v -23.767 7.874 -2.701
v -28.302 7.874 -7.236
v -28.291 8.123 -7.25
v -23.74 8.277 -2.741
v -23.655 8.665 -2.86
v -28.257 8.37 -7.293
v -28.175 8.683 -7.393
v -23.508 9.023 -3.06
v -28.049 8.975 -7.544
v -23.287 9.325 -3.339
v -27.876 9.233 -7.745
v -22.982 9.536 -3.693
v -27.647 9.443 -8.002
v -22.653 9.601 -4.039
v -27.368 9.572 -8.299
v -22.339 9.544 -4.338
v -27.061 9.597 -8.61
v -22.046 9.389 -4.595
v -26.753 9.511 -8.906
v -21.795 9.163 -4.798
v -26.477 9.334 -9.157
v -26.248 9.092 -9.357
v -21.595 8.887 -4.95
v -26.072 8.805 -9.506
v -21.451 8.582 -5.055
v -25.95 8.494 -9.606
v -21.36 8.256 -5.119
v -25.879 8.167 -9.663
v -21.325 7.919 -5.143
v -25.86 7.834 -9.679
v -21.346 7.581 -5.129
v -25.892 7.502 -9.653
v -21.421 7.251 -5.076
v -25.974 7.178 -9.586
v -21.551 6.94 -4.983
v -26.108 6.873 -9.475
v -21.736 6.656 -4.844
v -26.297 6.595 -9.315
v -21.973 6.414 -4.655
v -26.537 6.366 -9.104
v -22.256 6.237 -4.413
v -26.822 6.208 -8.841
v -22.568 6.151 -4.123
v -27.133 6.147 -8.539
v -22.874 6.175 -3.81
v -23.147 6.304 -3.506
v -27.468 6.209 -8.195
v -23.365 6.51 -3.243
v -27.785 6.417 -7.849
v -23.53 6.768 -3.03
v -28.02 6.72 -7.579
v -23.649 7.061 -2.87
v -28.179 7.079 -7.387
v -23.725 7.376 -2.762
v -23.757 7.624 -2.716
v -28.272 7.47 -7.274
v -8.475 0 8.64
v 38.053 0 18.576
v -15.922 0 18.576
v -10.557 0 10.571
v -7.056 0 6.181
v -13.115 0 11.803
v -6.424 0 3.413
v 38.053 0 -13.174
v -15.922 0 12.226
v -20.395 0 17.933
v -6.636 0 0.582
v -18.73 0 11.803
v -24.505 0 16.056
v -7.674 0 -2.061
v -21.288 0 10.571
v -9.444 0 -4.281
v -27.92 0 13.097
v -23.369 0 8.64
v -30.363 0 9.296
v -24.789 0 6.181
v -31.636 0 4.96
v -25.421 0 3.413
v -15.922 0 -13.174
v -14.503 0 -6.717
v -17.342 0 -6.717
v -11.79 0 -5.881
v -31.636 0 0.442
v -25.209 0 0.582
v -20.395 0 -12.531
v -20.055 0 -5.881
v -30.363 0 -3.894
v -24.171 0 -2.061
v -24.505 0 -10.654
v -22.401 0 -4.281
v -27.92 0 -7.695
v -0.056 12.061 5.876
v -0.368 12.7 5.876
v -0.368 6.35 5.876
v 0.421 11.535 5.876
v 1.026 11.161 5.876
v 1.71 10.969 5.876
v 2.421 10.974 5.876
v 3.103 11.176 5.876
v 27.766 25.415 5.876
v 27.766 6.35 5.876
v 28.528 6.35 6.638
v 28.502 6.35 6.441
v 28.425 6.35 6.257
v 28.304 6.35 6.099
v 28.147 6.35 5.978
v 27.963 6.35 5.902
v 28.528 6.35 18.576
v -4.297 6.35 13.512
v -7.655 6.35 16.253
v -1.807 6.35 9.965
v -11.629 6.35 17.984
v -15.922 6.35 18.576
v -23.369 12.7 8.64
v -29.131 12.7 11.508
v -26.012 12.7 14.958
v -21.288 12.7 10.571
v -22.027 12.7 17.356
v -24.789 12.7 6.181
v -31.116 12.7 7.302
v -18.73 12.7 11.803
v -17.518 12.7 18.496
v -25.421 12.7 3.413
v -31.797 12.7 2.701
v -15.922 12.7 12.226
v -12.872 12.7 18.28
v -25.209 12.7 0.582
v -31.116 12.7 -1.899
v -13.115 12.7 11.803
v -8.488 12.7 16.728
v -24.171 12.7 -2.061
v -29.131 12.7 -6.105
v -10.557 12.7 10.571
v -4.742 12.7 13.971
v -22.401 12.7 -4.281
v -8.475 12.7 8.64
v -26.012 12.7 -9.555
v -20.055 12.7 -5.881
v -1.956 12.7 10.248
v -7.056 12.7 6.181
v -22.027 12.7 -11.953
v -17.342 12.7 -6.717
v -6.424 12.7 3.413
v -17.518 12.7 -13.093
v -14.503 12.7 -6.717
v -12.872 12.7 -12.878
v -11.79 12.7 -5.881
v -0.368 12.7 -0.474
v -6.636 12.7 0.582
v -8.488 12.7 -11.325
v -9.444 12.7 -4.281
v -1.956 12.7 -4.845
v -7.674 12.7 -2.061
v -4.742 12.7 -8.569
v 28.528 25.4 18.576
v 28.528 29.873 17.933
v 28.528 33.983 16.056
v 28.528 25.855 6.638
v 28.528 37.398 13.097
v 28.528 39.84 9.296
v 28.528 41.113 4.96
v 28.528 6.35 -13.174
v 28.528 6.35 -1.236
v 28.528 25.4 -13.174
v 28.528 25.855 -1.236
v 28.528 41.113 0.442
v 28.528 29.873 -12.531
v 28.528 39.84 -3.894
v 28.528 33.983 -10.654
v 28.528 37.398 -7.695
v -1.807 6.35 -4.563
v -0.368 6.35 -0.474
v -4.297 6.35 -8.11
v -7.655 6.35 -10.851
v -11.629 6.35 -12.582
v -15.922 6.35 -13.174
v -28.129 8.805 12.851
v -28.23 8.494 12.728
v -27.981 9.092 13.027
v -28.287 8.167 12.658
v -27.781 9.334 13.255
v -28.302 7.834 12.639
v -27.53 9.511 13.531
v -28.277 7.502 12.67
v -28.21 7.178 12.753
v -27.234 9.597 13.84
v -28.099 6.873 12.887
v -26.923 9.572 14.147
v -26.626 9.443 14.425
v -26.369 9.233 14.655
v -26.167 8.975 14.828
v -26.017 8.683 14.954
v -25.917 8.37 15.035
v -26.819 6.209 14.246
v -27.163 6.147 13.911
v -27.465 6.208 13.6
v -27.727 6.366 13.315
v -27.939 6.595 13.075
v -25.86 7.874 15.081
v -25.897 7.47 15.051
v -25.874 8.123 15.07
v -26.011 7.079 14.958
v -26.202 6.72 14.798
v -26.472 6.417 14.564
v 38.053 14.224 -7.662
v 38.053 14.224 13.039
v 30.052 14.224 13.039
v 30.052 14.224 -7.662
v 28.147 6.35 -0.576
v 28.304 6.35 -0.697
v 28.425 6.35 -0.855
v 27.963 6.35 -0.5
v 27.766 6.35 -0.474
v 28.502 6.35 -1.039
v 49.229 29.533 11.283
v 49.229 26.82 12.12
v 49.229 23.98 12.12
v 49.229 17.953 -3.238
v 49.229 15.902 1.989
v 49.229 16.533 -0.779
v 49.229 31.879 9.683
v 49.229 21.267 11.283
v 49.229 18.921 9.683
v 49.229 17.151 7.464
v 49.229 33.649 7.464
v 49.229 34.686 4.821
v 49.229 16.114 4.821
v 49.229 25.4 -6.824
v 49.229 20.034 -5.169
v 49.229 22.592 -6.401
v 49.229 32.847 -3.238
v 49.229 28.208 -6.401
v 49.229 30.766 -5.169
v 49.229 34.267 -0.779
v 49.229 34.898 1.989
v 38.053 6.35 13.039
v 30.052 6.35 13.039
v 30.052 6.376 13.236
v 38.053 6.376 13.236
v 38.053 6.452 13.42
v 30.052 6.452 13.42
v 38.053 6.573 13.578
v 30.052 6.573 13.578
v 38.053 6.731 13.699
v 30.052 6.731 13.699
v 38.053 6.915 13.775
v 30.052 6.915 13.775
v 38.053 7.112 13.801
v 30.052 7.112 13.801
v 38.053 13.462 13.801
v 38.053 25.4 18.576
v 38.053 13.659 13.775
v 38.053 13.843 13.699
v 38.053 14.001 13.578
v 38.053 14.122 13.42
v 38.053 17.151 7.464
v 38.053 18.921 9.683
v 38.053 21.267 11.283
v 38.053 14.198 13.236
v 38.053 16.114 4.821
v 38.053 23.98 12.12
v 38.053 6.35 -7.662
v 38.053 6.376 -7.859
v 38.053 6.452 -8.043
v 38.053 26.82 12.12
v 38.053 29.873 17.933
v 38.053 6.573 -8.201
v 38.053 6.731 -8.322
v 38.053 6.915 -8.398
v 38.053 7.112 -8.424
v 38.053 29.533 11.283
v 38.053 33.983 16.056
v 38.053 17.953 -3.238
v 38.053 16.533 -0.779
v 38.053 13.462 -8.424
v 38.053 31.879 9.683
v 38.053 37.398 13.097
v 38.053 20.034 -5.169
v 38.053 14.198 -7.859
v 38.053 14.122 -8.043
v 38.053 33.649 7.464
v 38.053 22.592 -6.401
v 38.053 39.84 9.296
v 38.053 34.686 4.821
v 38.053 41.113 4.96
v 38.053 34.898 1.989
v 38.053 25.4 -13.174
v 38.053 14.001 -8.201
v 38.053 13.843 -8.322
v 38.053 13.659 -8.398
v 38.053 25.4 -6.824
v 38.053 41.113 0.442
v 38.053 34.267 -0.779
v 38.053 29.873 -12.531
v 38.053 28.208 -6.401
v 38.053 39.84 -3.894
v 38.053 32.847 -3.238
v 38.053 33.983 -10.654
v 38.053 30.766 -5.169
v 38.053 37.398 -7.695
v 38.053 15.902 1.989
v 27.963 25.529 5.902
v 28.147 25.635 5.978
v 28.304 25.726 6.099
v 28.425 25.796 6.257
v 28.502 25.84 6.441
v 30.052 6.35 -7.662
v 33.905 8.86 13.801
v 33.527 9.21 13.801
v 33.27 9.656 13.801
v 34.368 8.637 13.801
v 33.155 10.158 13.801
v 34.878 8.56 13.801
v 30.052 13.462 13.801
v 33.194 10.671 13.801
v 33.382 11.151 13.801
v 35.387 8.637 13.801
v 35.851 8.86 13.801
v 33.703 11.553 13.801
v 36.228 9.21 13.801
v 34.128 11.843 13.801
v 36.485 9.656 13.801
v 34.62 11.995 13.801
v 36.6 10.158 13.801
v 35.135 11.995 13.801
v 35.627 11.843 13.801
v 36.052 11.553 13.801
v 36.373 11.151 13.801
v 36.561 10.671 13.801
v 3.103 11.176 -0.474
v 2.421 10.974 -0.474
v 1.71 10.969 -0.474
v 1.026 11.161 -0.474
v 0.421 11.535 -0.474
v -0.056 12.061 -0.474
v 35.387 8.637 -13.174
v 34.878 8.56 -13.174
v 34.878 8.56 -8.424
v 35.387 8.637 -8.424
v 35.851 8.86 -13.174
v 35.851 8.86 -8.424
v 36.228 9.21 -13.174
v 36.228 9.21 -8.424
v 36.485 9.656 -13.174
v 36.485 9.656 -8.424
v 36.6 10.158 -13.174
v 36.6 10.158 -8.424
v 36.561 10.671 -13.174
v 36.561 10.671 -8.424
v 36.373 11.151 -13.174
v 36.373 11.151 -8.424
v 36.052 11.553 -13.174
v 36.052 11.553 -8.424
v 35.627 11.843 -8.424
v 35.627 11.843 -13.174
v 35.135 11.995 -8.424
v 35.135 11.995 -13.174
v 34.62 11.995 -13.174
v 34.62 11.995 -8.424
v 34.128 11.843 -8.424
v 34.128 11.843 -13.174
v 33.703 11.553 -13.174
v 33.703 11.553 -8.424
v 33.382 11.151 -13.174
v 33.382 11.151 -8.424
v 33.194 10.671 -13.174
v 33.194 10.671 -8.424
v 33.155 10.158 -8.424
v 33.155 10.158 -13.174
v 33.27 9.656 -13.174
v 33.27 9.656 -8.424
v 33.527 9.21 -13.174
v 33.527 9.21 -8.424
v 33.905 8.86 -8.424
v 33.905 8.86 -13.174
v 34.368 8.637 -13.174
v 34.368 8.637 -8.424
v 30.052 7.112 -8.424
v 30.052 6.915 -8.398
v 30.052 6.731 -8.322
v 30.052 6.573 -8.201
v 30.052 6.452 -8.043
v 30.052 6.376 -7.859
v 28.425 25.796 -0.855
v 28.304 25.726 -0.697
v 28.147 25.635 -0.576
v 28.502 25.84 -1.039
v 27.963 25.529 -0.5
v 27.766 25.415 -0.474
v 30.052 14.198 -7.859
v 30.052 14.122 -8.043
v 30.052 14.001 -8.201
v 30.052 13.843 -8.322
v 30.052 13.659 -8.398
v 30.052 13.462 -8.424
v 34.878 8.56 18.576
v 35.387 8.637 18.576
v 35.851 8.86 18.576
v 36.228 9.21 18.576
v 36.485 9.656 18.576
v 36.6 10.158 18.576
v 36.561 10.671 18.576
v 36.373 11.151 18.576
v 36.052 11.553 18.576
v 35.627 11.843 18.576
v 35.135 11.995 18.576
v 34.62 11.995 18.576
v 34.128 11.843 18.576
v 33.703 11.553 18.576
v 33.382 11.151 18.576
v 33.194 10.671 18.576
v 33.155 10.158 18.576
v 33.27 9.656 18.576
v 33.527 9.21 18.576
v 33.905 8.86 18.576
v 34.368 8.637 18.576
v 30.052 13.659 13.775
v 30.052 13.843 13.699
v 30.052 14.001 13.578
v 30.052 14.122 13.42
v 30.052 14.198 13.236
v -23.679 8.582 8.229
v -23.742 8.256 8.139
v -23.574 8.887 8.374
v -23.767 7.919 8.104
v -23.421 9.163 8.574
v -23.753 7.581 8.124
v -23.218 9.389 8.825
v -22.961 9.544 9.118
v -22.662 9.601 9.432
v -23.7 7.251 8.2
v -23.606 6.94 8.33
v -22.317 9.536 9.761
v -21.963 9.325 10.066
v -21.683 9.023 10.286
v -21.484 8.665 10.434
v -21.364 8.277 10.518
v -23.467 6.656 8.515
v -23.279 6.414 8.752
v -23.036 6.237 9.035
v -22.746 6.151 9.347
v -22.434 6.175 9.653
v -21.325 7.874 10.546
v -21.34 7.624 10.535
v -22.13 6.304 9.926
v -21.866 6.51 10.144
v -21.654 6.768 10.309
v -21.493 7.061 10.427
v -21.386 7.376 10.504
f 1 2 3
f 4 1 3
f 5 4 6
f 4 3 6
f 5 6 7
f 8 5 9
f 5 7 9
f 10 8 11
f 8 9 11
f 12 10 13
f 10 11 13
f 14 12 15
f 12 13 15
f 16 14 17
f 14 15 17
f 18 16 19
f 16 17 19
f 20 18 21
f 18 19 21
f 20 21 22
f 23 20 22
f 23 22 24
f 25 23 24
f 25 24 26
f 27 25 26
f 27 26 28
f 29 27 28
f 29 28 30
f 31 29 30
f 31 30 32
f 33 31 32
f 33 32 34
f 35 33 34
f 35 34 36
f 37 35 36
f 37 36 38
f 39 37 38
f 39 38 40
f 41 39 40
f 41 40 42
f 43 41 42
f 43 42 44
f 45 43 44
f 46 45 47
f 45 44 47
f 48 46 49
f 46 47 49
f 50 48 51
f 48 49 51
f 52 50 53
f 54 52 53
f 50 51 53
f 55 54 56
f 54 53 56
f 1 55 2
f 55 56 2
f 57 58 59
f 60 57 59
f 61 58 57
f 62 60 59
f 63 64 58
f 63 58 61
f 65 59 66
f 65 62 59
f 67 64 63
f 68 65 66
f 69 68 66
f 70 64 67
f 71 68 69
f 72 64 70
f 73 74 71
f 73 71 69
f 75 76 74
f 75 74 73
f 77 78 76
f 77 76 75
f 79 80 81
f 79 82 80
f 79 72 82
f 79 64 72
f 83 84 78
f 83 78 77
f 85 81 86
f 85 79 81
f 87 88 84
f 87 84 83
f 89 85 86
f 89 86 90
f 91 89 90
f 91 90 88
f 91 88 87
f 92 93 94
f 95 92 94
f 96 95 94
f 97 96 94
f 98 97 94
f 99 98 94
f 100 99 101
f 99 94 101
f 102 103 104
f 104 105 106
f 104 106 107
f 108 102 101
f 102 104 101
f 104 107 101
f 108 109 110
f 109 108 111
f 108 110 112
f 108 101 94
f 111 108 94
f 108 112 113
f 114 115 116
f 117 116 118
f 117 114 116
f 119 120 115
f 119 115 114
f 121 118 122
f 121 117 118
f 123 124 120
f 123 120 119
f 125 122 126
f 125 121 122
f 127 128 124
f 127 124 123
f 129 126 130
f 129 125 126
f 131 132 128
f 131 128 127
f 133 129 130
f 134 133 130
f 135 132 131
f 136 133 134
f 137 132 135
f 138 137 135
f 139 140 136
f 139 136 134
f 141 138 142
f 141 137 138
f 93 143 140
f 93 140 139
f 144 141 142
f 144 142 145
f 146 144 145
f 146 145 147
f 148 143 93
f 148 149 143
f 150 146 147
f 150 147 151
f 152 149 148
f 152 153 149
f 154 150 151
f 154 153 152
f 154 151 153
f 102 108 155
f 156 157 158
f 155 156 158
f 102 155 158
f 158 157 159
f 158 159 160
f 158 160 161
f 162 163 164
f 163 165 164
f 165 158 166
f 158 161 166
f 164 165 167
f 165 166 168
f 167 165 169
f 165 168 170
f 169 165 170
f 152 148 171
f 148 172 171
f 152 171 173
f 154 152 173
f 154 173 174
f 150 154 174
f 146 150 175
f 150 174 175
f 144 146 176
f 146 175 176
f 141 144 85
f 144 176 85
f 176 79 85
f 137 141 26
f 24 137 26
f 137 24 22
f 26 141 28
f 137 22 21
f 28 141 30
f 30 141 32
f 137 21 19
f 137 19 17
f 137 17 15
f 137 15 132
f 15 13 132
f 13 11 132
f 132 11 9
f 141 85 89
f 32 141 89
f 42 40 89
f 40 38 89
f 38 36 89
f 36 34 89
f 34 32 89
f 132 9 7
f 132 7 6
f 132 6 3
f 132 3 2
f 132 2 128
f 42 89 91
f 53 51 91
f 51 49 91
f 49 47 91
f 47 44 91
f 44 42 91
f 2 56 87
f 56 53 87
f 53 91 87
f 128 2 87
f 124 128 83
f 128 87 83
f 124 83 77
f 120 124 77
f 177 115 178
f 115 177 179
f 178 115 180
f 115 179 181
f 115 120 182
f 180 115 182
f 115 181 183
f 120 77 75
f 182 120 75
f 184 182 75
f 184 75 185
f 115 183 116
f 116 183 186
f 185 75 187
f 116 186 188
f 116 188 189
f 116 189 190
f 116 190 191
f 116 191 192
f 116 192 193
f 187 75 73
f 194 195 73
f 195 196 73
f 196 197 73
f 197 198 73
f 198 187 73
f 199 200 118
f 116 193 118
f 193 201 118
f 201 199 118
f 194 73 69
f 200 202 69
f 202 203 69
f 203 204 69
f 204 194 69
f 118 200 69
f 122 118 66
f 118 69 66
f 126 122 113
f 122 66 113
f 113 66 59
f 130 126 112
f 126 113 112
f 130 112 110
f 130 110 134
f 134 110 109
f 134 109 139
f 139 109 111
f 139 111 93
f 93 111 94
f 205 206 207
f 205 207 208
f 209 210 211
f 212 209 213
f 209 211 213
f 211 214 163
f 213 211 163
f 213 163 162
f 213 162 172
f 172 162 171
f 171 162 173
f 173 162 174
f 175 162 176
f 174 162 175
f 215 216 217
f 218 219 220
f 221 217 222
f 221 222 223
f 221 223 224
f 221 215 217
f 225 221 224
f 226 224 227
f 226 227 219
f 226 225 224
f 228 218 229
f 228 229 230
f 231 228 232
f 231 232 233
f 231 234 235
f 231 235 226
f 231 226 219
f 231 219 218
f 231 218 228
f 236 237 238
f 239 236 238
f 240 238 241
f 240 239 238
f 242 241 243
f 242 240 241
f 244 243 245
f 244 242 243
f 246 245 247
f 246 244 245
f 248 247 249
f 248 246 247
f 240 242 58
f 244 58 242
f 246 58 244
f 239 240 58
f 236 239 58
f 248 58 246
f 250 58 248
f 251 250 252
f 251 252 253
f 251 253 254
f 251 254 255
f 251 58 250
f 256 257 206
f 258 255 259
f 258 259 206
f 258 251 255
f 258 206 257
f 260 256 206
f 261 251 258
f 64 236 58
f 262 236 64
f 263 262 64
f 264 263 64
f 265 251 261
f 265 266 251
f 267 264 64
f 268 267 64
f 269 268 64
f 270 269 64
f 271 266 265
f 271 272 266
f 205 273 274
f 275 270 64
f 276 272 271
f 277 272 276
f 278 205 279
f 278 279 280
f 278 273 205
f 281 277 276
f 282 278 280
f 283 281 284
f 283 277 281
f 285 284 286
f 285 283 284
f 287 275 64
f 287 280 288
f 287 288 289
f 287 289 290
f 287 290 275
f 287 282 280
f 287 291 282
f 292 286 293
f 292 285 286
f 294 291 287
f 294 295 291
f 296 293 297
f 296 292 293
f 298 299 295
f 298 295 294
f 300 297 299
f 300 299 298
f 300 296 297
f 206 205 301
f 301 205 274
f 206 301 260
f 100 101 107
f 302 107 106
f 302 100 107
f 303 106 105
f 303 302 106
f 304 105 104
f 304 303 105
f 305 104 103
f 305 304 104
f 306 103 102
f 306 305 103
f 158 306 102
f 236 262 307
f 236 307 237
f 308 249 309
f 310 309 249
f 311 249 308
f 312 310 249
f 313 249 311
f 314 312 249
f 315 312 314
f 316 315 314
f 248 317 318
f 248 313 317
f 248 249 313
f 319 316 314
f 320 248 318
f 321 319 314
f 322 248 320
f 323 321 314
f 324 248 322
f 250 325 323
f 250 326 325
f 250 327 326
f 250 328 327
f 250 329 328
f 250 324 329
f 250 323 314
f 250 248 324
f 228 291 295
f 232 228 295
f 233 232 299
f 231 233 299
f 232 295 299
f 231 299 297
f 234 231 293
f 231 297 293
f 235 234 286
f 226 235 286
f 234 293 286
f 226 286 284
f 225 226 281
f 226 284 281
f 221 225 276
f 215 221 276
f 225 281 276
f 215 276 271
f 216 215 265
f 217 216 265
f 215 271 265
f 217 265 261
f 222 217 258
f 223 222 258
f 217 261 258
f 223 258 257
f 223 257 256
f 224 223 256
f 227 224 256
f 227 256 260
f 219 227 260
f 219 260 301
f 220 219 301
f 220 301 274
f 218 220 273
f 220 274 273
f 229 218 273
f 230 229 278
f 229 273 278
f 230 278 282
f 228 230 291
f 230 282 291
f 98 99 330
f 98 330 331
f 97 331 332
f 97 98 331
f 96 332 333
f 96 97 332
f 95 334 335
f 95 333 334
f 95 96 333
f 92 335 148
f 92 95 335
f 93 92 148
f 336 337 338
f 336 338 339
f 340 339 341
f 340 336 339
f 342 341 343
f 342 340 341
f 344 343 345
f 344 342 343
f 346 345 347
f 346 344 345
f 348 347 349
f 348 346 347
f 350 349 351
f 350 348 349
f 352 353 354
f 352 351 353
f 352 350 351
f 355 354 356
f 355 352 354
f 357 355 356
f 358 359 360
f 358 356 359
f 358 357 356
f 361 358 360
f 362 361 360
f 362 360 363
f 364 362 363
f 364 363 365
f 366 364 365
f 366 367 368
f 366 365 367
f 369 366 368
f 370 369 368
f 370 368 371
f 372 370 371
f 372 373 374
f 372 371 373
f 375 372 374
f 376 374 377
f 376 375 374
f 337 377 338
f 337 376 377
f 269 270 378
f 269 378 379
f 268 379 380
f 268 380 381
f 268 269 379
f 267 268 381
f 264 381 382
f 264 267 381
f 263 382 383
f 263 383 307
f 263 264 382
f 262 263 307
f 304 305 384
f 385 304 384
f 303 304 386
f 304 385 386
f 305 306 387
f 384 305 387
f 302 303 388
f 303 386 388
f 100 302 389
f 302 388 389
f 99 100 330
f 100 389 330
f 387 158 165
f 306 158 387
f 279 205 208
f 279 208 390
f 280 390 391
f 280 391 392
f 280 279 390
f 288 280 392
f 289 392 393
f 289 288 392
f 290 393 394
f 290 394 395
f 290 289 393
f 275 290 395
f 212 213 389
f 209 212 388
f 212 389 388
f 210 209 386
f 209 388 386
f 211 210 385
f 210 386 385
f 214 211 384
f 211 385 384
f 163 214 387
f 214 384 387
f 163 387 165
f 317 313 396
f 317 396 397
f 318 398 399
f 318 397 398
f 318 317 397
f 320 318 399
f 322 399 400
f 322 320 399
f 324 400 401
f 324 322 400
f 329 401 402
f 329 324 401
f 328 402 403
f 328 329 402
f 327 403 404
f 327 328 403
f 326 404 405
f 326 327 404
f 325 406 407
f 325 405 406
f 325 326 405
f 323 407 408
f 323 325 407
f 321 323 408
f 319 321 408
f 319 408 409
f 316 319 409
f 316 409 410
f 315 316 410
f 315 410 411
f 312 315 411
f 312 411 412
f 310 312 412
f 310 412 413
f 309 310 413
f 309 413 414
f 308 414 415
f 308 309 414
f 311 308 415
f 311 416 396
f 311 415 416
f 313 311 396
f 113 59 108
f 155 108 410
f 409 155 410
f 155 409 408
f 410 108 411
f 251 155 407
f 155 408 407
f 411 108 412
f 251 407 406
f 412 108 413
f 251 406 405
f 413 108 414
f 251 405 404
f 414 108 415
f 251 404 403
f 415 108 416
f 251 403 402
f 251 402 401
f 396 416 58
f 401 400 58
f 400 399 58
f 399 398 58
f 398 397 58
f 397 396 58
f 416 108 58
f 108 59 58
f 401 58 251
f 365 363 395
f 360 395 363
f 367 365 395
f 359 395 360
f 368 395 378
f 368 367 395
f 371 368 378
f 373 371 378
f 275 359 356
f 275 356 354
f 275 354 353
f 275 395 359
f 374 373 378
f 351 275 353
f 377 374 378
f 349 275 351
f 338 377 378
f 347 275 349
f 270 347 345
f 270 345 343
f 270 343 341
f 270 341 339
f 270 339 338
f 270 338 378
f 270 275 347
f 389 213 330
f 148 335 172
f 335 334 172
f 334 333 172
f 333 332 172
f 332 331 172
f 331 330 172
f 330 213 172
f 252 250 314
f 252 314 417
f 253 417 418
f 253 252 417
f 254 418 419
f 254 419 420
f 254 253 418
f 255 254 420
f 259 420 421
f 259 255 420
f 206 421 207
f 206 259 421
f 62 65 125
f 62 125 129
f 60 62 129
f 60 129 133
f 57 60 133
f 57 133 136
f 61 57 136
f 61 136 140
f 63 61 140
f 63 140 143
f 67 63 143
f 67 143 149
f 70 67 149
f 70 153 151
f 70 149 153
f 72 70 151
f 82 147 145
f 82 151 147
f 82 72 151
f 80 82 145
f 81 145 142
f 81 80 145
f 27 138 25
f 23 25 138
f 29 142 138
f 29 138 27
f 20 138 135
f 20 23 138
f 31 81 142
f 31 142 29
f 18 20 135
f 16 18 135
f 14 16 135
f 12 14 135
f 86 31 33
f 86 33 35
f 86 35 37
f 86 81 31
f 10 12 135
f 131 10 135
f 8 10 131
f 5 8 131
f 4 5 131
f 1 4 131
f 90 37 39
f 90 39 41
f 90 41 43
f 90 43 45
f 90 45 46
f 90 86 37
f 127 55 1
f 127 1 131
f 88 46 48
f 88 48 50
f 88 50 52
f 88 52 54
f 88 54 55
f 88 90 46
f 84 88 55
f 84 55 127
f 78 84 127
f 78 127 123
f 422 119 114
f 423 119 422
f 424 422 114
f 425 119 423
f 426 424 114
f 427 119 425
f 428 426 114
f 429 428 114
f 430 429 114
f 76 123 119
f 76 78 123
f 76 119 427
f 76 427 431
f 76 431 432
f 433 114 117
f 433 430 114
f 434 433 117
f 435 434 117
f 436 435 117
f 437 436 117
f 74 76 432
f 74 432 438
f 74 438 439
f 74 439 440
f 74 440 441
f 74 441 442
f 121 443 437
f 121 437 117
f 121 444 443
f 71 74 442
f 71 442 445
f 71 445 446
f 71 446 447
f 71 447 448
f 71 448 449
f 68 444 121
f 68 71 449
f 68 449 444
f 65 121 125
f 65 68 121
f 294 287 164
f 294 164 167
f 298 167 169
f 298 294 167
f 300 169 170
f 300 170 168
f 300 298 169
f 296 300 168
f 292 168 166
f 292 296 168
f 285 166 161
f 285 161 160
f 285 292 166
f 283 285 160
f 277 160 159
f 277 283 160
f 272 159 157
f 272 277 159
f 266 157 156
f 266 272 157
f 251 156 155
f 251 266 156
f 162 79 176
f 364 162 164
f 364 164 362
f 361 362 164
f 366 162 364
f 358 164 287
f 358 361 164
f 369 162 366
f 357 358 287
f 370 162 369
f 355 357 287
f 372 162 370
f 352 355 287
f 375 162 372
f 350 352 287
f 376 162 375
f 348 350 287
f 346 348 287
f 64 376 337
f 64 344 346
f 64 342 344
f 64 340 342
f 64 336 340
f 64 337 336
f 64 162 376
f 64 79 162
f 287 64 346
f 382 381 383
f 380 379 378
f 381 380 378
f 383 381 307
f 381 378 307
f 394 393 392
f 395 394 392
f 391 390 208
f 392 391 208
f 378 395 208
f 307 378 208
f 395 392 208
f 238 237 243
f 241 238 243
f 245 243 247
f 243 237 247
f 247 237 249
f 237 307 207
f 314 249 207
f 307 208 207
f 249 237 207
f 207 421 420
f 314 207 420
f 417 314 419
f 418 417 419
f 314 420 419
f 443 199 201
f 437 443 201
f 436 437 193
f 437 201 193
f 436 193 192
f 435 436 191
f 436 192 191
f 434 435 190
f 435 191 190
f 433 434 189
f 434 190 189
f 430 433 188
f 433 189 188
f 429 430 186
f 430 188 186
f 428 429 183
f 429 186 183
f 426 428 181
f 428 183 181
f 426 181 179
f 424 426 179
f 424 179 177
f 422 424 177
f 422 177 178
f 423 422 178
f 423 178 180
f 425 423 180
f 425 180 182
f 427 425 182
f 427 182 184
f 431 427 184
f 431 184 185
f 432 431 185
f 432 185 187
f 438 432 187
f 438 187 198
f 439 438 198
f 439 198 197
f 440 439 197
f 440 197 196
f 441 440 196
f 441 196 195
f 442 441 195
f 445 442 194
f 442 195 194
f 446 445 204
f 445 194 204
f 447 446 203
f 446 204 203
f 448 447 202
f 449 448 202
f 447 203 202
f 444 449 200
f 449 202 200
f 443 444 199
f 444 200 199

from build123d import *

# Parameters (mm, degrees)
SKETCH4_W                 = 53.975
SKETCH4_H                 = 31.75
BOSS_EXTRUDE1_DEPTH       = 6.35
SKETCH5_R                 = 15.875
BOSS_EXTRUDE2_DEPTH       = 6.35
CUT_EXTRUDE1_DEPTH        = 45.208170155
CUT_EXTRUDE1_DEPTH_BACK   = 45.208170155
SKETCH6_R                 = 9.525
SKETCH7_W                 = 9.525
SKETCH7_H                 = 25.4
BOSS_EXTRUDE3_DEPTH       = 31.75
BOSS_EXTRUDE4_DEPTH       = 9.525
SKETCH9_R                 = 9.525
BOSS_EXTRUDE5_DEPTH       = 11.176
CUT_EXTRUDE2_DEPTH        = 8.001
BOSS_EXTRUDE11_DEPTH      = 3.175
BOSS_EXTRUDE11_DEPTH_BACK = 3.175
BOSS_EXTRUDE12_START      = -6.35
BOSS_EXTRUDE12_DEPTH      = 6.35
CUT_EXTRUDE3_DEPTH        = 68.007319115
CUT_EXTRUDE3_DEPTH_BACK   = 68.007319115
CUT_EXTRUDE5_REACH        = 87.932
CUT_EXTRUDE5_END_RADIUS   = 9.525
SKETCH21_R                = 1.7272
CIRPATTERN1_COUNT         = 2
CIRPATTERN1_ANGLE         = 90
FILLET3_R                 = 0.762
CUT_EXTRUDE6_DEPTH        = 72.659896883
CUT_EXTRUDE6_DEPTH_BACK   = 72.659896883
SKETCH22_R                = 1.7272


with BuildPart() as part:
    # Sketch4 → Boss-Extrude1 (new body)
    with BuildSketch(Plane(origin=(0, 0, 0), x_dir=(1, 0, 0), z_dir=(0, 1, 0))):
        with BuildLine():
            Line((-15.922424051, 13.173838608), (-15.922424051, -18.576161392))
            ThreePointArc((-15.922424051, -18.576161392), (-31.797424051, -2.701161392), (-15.922424051, 13.173838608))
        make_face()
        with Locations((11.065075949, -2.701161392)):
            Rectangle(SKETCH4_W, SKETCH4_H)
    extrude(amount=BOSS_EXTRUDE1_DEPTH)

    # Sketch5 → Boss-Extrude2 (add)
    with BuildSketch(Plane(origin=(0, 6.35, 0), x_dir=(1, 0, 0), z_dir=(0, 1, 0))):
        with Locations(Location((-15.922424051, -2.701161392, 0), (0, 0, 270))):
            Circle(SKETCH5_R)
    extrude(amount=BOSS_EXTRUDE2_DEPTH)

    # Sketch6 → Cut-Extrude1 (cut, two sides: drawn at the far end of the back side and taken through both)
    with BuildSketch(Plane(origin=(0, 12.7, 0), x_dir=(1, 0, 0), z_dir=(0, 1, 0)).offset(-CUT_EXTRUDE1_DEPTH_BACK)):
        with Locations(Location((-15.922424051, -2.701161392, 0), (0, 0, 270))):
            Circle(SKETCH6_R)
    extrude(amount=CUT_EXTRUDE1_DEPTH + CUT_EXTRUDE1_DEPTH_BACK, mode=Mode.SUBTRACT)

    # Sketch7 → Boss-Extrude3 (add)
    with BuildSketch(Plane.XY.offset(18.576161392)):
        with Locations((33.290075949, 12.7)):
            Rectangle(SKETCH7_W, SKETCH7_H)
    extrude(amount=-BOSS_EXTRUDE3_DEPTH)

    # Sketch8 → Boss-Extrude4 (add)
    with BuildSketch(Plane(origin=(38.052575949, 0, 0), x_dir=(0, 0, -1), z_dir=(1, 0, 0))):
        with BuildLine():
            Line((-18.576161392, 25.4), (13.173838608, 25.4))
            ThreePointArc((13.173838608, 25.4), (-2.701161392, 41.275), (-18.576161392, 25.4))
        make_face()
    extrude(amount=-BOSS_EXTRUDE4_DEPTH)

    # Sketch9 → Boss-Extrude5 (add)
    with BuildSketch(Plane(origin=(38.052575949, 0, 0), x_dir=(0, 0, -1), z_dir=(1, 0, 0))):
        with Locations((-2.701161392, 25.4)):
            Circle(SKETCH9_R)
    extrude(amount=BOSS_EXTRUDE5_DEPTH)

    # Sketch10 → Cut-Extrude2 (cut)
    with BuildSketch(Plane(origin=(38.052575949, 0, 0), x_dir=(0, 0, -1), z_dir=(1, 0, 0))):
        with BuildLine():
            Line((-13.038961392, 14.224), (7.662038608, 14.224))
            ThreePointArc((7.662038608, 14.224), (8.200853975, 14.000815367), (8.424038608, 13.462))
            Line((8.424038608, 13.462), (8.424038608, 7.112))
            ThreePointArc((8.424038608, 7.112), (8.200853975, 6.573184633), (7.662038608, 6.35))
            Line((7.662038608, 6.35), (-13.038961392, 6.35))
            ThreePointArc((-13.038961392, 6.35), (-13.57777676, 6.573184633), (-13.800961392, 7.112))
            Line((-13.800961392, 7.112), (-13.800961392, 13.462))
            ThreePointArc((-13.800961392, 13.462), (-13.57777676, 14.000815367), (-13.038961392, 14.224))
        make_face()
    extrude(amount=-CUT_EXTRUDE2_DEPTH, mode=Mode.SUBTRACT)

    # Sketch12 → Boss-Extrude11 (add, two sides: drawn at the far end of the back side and taken through both)
    with BuildSketch(Plane.XY.offset(2.701161392).offset(-BOSS_EXTRUDE11_DEPTH_BACK)):
        Polygon((28.527575949, 6.35), (28.527575949, 25.8550254), (3.102758151, 11.176), (3.102758151, 6.35), align=None)
    extrude(amount=BOSS_EXTRUDE11_DEPTH + BOSS_EXTRUDE11_DEPTH_BACK)

    # Sketch17 → Boss-Extrude12 (add)
    with BuildSketch(Plane(origin=(0, 12.7, 0), x_dir=(1, 0, 0), z_dir=(0, 1, 0)).offset(BOSS_EXTRUDE12_START)):
        with BuildLine():
            Line((3.102758151, 0.473838608), (-0.368164184, 0.473838608))
            ThreePointArc((-0.368164184, 0.473838608), (-0.047424051, -2.701161392), (-0.368164184, -5.876161392))
            Line((-0.368164184, -5.876161392), (3.102758151, -5.876161392))
            Line((3.102758151, -5.876161392), (3.102758151, 0.473838608))
        make_face()
    extrude(amount=BOSS_EXTRUDE12_DEPTH)

    # Sketch19 → Cut-Extrude3 (cut, two sides: drawn at the far end of the back side and taken through both)
    with BuildSketch(Plane(origin=(0, 0, -0.473838608), x_dir=(-1, 0, 0), z_dir=(0, 0, -1)).offset(-CUT_EXTRUDE3_DEPTH_BACK)):
        with BuildLine():
            Line((0.368164184, 12.7), (-3.102758151, 12.7))
            Line((-3.102758151, 12.7), (-3.102758151, 11.176))
            ThreePointArc((-3.102758151, 11.176), (-1.025931877, 11.160538208), (0.368164184, 12.7))
        make_face()
    extrude(amount=CUT_EXTRUDE3_DEPTH + CUT_EXTRUDE3_DEPTH_BACK, mode=Mode.SUBTRACT)

    # Cut-Extrude5: up to this cylinder (the profile starts outside it)
    cut_extrude5_end = Plane(origin=(-15.922424051, 7.874, 2.701161392), z_dir=(0, 1, 0)) * Cylinder(CUT_EXTRUDE5_END_RADIUS, 195.914, mode=Mode.PRIVATE)
    # Sketch21 → Cut-Extrude5 (cut, up to the surface)
    with BuildSketch(Plane(origin=(-27.147744202, 12.7, 13.926481544), x_dir=(0.7071067811865489, 0, 0.7071067811865462), z_dir=(-0.7071067811865462, 0, 0.7071067811865489)), mode=Mode.PRIVATE) as cut_extrude5_sk1:
        with Locations((0, -4.826)):
            Circle(SKETCH21_R)
    cut_extrude5_tool1 = extrude(cut_extrude5_sk1.sketch, amount=-CUT_EXTRUDE5_REACH, mode=Mode.PRIVATE) - cut_extrude5_end
    cut_extrude5 = cut_extrude5_tool1.solids().sort_by_distance((-27.147744, 7.874, 13.926482))[0]
    add(cut_extrude5, mode=Mode.SUBTRACT)

    # CirPattern1: Cut-Extrude5 ×2 about axis
    cirpattern1_axis = Axis((-15.922424051, 0, 2.701161392), (0, -1, 0))
    for i in range(1, CIRPATTERN1_COUNT):
        add(cut_extrude5.rotate(cirpattern1_axis, i * CIRPATTERN1_ANGLE / (CIRPATTERN1_COUNT - 1)), mode=Mode.SUBTRACT)

    # Fillet3
    fillet3_edges = [part.edges().sort_by_distance(p)[0] for p in [
        (28.527575949, 16.1025127, -0.473838608),
        (28.527575949, 16.1025127, 5.876161392),
    ]]
    fillet(fillet3_edges, radius=FILLET3_R)

    # Sketch22 → Cut-Extrude6 (cut, two sides: drawn at the far end of the back side and taken through both)
    with BuildSketch(Plane.XY.offset(18.576161392).offset(-CUT_EXTRUDE6_DEPTH_BACK)):
        with Locations(Location((34.877575949, 10.287, 0), (0, 0, 270))):
            Circle(SKETCH22_R)
    extrude(amount=CUT_EXTRUDE6_DEPTH + CUT_EXTRUDE6_DEPTH_BACK, mode=Mode.SUBTRACT)


solid = part.part
